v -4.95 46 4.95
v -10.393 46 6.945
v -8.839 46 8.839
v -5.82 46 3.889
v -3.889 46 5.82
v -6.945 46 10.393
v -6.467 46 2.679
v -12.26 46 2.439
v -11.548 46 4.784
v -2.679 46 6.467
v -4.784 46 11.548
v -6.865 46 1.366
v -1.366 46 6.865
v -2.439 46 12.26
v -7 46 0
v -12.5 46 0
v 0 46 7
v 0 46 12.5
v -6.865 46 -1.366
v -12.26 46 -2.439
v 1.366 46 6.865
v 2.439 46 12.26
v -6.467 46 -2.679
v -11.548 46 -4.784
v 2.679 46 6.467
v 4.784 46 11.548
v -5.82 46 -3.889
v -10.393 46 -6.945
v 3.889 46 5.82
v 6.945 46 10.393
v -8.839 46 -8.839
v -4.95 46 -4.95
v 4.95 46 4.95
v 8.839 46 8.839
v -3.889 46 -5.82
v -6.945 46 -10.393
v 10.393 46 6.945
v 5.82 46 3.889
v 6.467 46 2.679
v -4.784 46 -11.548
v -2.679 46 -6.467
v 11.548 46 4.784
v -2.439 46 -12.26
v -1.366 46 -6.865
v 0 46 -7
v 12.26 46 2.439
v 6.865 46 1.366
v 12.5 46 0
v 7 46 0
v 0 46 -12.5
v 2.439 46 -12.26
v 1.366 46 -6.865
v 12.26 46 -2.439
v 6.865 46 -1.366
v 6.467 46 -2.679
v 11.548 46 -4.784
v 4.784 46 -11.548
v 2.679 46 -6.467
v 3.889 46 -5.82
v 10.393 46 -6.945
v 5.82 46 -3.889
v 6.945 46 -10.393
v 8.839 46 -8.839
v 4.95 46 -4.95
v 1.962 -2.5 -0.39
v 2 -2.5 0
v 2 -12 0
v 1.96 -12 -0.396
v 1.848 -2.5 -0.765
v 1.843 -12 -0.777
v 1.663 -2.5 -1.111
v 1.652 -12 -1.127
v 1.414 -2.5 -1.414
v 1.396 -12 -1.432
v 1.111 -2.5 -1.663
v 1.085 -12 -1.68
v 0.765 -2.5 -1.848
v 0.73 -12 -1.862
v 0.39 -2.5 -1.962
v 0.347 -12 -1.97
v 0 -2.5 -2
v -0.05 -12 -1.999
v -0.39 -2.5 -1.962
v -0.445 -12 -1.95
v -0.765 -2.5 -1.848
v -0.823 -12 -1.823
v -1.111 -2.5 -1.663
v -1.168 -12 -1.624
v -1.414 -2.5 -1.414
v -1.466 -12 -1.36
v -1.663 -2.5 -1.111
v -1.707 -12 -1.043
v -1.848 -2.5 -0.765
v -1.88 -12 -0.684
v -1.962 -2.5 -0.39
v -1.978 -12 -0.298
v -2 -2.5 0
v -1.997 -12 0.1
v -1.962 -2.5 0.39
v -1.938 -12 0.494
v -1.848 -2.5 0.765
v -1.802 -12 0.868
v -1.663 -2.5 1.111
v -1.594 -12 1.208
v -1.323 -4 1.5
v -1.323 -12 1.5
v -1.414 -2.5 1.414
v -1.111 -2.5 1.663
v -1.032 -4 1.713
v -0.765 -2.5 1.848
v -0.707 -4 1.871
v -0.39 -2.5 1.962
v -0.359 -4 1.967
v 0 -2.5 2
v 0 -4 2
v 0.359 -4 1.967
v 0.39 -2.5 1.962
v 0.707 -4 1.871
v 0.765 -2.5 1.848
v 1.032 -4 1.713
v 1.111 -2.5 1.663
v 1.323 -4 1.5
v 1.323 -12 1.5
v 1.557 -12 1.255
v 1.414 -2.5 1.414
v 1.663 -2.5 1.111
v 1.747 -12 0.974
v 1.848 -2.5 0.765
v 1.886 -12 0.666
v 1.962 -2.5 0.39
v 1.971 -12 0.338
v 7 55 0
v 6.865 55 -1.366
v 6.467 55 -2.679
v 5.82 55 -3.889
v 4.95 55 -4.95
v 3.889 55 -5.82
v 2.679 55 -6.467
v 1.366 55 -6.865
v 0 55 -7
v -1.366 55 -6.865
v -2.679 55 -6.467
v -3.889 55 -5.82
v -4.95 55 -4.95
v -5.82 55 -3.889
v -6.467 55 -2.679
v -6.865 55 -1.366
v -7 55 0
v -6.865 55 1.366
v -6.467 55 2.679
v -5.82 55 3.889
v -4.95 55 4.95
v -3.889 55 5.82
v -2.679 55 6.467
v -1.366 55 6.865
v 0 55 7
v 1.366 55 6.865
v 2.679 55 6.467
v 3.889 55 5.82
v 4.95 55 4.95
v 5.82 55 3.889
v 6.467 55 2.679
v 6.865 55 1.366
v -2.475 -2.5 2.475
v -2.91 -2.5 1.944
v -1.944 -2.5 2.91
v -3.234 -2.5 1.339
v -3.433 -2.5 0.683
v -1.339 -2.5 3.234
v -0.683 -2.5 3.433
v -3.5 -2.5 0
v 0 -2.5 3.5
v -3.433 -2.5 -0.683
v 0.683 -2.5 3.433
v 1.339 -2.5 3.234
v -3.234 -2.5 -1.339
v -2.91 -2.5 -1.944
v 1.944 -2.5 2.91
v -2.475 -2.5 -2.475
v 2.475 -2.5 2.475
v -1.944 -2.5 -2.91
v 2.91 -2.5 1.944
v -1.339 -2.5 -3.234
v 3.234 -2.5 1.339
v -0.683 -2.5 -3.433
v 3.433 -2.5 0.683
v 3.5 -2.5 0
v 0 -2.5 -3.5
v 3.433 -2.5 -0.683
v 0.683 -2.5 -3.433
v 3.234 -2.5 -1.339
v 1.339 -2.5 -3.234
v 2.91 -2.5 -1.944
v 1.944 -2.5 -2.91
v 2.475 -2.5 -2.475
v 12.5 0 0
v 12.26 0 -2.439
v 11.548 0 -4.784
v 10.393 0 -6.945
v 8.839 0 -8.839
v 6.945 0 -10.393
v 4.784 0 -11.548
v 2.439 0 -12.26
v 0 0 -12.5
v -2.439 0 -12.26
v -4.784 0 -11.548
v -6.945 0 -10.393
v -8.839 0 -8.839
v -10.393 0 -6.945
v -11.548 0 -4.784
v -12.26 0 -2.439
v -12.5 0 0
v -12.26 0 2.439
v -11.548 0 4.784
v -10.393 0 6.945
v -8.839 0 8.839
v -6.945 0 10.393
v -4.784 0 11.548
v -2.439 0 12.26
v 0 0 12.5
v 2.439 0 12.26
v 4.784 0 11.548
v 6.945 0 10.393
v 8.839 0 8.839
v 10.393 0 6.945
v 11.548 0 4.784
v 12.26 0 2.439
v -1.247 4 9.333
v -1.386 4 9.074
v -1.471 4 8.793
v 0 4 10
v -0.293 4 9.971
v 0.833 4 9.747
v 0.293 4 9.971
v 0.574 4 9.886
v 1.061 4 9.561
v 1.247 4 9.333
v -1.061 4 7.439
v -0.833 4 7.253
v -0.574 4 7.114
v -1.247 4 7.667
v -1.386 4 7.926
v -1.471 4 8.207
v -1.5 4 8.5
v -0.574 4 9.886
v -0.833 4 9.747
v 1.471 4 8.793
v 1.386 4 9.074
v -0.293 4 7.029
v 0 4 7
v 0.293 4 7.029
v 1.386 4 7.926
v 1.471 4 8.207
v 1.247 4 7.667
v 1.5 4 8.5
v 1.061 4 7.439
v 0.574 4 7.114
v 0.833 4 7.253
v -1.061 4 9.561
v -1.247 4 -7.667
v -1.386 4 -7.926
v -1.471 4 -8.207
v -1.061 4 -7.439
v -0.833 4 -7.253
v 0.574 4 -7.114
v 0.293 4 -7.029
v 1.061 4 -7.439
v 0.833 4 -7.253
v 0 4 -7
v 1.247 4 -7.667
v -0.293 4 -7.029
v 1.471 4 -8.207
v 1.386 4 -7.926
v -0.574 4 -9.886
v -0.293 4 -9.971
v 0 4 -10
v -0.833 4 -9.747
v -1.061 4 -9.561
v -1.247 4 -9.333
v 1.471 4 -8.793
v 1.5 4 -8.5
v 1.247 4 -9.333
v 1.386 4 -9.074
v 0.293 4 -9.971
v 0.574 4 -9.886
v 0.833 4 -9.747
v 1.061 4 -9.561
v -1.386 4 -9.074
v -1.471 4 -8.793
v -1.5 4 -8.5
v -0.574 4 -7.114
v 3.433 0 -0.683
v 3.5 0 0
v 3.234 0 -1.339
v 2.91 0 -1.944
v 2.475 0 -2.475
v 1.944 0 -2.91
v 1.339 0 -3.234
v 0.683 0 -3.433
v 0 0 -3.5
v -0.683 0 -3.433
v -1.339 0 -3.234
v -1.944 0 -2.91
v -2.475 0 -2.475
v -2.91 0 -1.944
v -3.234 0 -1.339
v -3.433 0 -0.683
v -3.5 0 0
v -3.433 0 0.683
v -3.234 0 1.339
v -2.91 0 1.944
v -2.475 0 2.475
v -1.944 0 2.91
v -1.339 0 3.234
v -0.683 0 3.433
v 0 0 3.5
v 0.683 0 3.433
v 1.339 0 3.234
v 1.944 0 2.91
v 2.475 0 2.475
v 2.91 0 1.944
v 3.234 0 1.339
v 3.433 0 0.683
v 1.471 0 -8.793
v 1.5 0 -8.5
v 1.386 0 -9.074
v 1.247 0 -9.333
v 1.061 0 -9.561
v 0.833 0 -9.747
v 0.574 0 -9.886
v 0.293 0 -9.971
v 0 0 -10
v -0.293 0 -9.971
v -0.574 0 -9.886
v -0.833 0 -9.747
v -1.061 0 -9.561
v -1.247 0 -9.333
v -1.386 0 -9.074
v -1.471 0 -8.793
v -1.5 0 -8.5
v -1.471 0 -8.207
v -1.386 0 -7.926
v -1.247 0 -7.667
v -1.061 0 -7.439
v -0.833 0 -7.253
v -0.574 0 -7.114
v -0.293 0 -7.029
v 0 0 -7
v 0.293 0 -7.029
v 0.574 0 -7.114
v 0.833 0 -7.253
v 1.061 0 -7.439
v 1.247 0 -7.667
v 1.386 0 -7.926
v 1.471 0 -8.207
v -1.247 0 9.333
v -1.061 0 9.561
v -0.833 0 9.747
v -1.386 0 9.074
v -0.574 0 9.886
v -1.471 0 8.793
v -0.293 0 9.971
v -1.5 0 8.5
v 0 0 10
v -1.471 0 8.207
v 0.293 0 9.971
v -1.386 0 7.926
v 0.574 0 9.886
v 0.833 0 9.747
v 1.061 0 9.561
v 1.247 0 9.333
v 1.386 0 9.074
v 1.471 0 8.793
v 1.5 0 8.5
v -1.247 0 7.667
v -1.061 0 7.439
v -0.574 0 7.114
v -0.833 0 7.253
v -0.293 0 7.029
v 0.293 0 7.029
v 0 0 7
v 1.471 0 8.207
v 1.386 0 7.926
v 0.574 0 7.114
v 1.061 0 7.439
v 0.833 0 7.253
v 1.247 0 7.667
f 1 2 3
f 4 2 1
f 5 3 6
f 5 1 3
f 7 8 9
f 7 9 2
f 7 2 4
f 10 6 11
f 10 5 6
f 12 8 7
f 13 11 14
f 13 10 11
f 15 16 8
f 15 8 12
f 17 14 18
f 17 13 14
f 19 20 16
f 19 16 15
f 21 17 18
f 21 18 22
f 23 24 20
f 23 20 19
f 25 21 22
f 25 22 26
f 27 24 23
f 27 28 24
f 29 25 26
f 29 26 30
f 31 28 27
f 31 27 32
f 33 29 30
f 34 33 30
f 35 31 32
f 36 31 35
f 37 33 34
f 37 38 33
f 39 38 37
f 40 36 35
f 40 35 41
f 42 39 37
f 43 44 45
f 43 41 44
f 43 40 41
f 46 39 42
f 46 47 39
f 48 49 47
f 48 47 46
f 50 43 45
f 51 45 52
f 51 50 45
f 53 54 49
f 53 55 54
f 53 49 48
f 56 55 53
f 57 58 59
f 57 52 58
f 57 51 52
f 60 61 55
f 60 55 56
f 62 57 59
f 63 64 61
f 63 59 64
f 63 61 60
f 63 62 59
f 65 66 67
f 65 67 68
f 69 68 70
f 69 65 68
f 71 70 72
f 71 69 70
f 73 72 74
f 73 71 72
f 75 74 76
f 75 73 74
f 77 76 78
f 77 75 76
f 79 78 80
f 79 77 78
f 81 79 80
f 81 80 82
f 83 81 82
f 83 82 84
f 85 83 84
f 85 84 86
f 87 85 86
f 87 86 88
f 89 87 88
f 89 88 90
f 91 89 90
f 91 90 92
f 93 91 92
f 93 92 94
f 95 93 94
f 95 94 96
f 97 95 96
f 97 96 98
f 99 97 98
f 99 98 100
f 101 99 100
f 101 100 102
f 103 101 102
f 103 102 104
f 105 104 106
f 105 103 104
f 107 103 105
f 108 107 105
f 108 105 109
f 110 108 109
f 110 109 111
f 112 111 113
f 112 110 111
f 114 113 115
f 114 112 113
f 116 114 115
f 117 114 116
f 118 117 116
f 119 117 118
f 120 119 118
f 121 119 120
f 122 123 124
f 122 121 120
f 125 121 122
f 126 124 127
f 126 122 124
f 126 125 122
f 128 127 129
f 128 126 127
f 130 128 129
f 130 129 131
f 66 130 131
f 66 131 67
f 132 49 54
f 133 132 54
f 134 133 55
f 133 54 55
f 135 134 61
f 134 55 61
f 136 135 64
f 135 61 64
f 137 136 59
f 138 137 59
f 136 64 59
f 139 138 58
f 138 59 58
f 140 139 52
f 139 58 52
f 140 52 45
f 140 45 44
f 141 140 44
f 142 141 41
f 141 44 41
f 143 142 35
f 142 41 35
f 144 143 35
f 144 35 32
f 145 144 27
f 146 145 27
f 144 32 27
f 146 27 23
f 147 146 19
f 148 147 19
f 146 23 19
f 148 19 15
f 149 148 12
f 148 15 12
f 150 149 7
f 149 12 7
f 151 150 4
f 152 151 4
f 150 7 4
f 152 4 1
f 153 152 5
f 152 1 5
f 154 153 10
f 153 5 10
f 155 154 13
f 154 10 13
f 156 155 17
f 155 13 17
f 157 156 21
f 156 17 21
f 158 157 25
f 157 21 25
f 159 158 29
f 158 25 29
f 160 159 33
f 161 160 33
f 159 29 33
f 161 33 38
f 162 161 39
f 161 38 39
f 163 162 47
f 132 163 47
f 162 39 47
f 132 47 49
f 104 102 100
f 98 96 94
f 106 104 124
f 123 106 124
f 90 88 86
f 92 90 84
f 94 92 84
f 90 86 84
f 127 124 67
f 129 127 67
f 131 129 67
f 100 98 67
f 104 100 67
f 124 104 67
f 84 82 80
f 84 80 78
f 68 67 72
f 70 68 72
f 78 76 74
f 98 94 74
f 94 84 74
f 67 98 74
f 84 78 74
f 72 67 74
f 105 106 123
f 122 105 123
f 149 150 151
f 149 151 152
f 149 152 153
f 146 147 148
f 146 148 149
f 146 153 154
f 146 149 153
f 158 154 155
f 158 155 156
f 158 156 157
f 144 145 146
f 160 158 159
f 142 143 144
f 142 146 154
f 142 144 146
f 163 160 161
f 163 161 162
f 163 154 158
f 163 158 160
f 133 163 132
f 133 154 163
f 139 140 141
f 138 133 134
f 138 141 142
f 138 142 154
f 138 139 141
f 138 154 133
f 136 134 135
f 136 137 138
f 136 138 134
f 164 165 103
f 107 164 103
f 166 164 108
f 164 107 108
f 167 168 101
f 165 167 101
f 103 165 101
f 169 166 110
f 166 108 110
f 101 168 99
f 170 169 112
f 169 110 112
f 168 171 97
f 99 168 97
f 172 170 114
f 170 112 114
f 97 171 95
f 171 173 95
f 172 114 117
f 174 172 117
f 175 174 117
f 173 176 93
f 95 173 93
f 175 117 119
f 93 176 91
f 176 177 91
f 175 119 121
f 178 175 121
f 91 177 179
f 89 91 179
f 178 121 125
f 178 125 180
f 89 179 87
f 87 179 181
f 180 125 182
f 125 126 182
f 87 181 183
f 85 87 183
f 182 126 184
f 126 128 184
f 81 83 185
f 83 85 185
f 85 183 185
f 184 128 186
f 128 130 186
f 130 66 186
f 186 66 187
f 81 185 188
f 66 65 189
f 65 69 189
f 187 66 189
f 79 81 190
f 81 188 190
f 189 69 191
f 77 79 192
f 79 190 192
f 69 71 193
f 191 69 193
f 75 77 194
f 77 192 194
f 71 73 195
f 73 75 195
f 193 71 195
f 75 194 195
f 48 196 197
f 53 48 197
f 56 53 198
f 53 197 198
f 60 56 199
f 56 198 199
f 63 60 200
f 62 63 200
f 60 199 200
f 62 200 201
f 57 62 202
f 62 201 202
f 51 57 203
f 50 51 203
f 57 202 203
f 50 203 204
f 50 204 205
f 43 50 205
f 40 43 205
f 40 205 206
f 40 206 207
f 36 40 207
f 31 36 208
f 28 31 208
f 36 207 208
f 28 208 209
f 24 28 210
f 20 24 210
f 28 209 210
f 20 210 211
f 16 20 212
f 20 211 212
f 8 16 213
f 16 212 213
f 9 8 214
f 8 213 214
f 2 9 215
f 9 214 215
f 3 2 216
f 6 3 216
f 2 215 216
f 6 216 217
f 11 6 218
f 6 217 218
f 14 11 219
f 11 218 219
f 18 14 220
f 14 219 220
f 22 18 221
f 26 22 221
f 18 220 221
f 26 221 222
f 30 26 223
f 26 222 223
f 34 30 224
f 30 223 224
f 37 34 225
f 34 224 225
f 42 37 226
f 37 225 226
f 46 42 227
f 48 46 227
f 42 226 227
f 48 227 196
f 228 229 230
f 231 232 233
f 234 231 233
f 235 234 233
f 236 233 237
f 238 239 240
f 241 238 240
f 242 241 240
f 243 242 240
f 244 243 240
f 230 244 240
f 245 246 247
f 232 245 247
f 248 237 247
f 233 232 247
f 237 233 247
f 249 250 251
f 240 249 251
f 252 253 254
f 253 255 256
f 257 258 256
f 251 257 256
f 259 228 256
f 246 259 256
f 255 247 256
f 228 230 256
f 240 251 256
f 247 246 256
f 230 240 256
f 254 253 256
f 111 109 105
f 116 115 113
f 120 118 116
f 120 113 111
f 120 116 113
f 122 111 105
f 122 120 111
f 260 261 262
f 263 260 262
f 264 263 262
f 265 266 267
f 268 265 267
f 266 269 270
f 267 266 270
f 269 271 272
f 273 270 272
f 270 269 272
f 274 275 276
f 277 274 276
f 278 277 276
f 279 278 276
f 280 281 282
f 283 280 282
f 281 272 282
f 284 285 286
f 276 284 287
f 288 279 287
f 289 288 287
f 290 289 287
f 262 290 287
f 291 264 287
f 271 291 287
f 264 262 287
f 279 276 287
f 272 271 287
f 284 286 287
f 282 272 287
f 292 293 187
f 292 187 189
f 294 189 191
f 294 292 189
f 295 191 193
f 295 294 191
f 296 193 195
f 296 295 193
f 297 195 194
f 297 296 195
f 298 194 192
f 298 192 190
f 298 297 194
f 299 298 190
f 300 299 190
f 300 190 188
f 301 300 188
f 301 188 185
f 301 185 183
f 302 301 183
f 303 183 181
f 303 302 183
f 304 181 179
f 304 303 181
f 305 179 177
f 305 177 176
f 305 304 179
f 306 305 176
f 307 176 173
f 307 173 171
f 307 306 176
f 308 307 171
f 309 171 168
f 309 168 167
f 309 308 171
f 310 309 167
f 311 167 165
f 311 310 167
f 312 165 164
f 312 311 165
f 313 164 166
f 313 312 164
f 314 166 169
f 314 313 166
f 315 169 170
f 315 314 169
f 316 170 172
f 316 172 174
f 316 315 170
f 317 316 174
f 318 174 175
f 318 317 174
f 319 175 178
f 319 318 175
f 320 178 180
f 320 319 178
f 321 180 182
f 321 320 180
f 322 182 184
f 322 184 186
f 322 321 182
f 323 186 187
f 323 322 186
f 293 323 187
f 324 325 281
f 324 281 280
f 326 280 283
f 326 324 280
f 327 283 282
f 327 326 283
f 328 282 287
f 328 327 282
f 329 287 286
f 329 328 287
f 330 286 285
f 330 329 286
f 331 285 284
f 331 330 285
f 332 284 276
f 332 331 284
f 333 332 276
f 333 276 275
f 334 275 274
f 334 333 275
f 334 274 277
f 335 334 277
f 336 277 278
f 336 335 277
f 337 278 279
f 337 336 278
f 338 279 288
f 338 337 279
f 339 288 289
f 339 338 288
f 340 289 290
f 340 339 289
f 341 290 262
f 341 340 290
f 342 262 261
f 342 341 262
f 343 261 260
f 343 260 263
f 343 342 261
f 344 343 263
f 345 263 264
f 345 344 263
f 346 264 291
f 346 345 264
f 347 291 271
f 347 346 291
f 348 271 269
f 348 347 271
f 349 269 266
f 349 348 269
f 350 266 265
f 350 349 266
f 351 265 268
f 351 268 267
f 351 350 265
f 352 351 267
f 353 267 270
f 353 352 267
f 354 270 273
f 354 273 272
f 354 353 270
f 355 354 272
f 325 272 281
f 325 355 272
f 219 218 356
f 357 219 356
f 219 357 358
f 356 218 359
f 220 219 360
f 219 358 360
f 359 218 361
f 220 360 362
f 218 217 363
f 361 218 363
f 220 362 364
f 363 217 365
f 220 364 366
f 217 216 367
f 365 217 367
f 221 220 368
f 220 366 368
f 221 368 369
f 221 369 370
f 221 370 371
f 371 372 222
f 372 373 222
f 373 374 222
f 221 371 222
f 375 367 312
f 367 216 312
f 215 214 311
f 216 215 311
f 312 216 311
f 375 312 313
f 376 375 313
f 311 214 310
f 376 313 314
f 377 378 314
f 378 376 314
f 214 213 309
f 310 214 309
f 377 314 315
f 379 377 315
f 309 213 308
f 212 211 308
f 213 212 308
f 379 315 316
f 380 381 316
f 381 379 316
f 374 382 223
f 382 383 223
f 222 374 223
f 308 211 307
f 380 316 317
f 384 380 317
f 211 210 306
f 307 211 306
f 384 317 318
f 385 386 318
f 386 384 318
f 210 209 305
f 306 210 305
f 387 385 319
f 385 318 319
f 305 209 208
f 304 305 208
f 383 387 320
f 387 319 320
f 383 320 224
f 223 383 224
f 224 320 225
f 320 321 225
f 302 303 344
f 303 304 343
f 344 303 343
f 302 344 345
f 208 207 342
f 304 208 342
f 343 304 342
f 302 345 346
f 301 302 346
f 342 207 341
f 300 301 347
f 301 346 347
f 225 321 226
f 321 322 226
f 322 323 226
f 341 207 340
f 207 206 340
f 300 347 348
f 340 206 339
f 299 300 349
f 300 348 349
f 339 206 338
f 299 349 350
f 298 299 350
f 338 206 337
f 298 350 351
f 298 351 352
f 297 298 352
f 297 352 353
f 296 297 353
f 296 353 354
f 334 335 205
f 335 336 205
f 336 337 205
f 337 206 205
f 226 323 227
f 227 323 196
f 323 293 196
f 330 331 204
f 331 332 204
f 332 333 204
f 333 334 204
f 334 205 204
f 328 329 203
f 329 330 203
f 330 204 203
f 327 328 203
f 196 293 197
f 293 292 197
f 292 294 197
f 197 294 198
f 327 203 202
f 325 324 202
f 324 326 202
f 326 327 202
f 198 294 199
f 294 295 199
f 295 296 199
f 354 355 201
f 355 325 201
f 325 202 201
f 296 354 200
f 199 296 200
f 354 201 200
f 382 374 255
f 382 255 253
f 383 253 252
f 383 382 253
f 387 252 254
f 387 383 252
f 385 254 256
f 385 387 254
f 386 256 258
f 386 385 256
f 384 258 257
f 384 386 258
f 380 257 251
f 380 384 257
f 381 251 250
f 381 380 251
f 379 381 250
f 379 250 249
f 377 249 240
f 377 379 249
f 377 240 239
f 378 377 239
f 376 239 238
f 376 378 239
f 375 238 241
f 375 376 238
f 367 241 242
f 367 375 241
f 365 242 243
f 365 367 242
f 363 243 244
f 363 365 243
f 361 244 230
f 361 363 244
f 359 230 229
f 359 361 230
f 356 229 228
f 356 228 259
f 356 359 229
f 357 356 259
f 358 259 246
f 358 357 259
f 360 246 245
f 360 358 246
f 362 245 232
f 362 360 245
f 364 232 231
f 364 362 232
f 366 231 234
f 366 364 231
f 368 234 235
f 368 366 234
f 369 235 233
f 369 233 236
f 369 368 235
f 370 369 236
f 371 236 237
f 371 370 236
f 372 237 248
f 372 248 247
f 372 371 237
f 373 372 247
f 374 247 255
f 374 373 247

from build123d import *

# Parameters (mm, degrees)
SKETCH1_R           = 12.5
BODY_DEPTH          = 46
SKETCH2_R           = 7
BOSS_EXTRUDE4_DEPTH = 9
SKETCH5_R           = 3.5
SKETCH5_R_2         = 2
BOSS_EXTRUDE5_DEPTH = 2.5
SKETCH10_R          = 2
BOSS_EXTRUDE6_DEPTH = 12
CUT_EXTRUDE1_DEPTH  = 8
SKETCH13_R          = 1.5
CUT_EXTRUDE2_DEPTH  = 4


with BuildPart() as part:
    # Sketch1 → Body (new body)
    with BuildSketch(Plane(origin=(0, 0, 0), x_dir=(1, 0, 0), z_dir=(0, 1, 0))):
        Circle(SKETCH1_R)
    extrude(amount=BODY_DEPTH)

    # Sketch2 → Boss-Extrude4 (add)
    with BuildSketch(Plane(origin=(0, 46, 0), x_dir=(1, 0, 0), z_dir=(0, 1, 0))):
        Circle(SKETCH2_R)
    extrude(amount=BOSS_EXTRUDE4_DEPTH)

    # Sketch5 → Boss-Extrude5 (add)
    with BuildSketch(Plane(origin=(0, 0, 0), x_dir=(1, 0, 0), z_dir=(0, 1, 0))):
        Circle(SKETCH5_R)
        Circle(SKETCH5_R_2, mode=Mode.SUBTRACT)
    extrude(amount=-BOSS_EXTRUDE5_DEPTH)

    # Sketch10 → Boss-Extrude6 (add)
    with BuildSketch(Plane(origin=(0, 0, 0), x_dir=(1, 0, 0), z_dir=(0, 1, 0))):
        Circle(SKETCH10_R)
    extrude(amount=-BOSS_EXTRUDE6_DEPTH)

    # Sketch12 → Cut-Extrude1 (cut)
    with BuildSketch(Plane.XZ.offset(12)):
        with BuildLine():
            Line((-1.322875656, 1.5), (1.322875656, 1.5))
            ThreePointArc((1.322875656, 1.5), (0, 2), (-1.322875656, 1.5))
        make_face()
    extrude(amount=-CUT_EXTRUDE1_DEPTH, mode=Mode.SUBTRACT)

    # Sketch13 → Cut-Extrude2 (cut)
    with BuildSketch(Plane(origin=(0, 0, 0), x_dir=(1, 0, 0), z_dir=(0, 1, 0))):
        with Locations((0, 8.5)):
            Circle(SKETCH13_R)
        with Locations((0, -8.5)):
            Circle(SKETCH13_R)
    extrude(amount=CUT_EXTRUDE2_DEPTH, mode=Mode.SUBTRACT)


solid = part.part
